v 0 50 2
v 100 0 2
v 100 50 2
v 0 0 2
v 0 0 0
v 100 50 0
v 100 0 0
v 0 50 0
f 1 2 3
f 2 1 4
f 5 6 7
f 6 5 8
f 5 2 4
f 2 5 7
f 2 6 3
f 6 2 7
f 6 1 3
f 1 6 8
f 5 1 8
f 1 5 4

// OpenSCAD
length1 = 100;
length2 = 50;
thickness = 2;
cube([length1, length2, thickness]);
